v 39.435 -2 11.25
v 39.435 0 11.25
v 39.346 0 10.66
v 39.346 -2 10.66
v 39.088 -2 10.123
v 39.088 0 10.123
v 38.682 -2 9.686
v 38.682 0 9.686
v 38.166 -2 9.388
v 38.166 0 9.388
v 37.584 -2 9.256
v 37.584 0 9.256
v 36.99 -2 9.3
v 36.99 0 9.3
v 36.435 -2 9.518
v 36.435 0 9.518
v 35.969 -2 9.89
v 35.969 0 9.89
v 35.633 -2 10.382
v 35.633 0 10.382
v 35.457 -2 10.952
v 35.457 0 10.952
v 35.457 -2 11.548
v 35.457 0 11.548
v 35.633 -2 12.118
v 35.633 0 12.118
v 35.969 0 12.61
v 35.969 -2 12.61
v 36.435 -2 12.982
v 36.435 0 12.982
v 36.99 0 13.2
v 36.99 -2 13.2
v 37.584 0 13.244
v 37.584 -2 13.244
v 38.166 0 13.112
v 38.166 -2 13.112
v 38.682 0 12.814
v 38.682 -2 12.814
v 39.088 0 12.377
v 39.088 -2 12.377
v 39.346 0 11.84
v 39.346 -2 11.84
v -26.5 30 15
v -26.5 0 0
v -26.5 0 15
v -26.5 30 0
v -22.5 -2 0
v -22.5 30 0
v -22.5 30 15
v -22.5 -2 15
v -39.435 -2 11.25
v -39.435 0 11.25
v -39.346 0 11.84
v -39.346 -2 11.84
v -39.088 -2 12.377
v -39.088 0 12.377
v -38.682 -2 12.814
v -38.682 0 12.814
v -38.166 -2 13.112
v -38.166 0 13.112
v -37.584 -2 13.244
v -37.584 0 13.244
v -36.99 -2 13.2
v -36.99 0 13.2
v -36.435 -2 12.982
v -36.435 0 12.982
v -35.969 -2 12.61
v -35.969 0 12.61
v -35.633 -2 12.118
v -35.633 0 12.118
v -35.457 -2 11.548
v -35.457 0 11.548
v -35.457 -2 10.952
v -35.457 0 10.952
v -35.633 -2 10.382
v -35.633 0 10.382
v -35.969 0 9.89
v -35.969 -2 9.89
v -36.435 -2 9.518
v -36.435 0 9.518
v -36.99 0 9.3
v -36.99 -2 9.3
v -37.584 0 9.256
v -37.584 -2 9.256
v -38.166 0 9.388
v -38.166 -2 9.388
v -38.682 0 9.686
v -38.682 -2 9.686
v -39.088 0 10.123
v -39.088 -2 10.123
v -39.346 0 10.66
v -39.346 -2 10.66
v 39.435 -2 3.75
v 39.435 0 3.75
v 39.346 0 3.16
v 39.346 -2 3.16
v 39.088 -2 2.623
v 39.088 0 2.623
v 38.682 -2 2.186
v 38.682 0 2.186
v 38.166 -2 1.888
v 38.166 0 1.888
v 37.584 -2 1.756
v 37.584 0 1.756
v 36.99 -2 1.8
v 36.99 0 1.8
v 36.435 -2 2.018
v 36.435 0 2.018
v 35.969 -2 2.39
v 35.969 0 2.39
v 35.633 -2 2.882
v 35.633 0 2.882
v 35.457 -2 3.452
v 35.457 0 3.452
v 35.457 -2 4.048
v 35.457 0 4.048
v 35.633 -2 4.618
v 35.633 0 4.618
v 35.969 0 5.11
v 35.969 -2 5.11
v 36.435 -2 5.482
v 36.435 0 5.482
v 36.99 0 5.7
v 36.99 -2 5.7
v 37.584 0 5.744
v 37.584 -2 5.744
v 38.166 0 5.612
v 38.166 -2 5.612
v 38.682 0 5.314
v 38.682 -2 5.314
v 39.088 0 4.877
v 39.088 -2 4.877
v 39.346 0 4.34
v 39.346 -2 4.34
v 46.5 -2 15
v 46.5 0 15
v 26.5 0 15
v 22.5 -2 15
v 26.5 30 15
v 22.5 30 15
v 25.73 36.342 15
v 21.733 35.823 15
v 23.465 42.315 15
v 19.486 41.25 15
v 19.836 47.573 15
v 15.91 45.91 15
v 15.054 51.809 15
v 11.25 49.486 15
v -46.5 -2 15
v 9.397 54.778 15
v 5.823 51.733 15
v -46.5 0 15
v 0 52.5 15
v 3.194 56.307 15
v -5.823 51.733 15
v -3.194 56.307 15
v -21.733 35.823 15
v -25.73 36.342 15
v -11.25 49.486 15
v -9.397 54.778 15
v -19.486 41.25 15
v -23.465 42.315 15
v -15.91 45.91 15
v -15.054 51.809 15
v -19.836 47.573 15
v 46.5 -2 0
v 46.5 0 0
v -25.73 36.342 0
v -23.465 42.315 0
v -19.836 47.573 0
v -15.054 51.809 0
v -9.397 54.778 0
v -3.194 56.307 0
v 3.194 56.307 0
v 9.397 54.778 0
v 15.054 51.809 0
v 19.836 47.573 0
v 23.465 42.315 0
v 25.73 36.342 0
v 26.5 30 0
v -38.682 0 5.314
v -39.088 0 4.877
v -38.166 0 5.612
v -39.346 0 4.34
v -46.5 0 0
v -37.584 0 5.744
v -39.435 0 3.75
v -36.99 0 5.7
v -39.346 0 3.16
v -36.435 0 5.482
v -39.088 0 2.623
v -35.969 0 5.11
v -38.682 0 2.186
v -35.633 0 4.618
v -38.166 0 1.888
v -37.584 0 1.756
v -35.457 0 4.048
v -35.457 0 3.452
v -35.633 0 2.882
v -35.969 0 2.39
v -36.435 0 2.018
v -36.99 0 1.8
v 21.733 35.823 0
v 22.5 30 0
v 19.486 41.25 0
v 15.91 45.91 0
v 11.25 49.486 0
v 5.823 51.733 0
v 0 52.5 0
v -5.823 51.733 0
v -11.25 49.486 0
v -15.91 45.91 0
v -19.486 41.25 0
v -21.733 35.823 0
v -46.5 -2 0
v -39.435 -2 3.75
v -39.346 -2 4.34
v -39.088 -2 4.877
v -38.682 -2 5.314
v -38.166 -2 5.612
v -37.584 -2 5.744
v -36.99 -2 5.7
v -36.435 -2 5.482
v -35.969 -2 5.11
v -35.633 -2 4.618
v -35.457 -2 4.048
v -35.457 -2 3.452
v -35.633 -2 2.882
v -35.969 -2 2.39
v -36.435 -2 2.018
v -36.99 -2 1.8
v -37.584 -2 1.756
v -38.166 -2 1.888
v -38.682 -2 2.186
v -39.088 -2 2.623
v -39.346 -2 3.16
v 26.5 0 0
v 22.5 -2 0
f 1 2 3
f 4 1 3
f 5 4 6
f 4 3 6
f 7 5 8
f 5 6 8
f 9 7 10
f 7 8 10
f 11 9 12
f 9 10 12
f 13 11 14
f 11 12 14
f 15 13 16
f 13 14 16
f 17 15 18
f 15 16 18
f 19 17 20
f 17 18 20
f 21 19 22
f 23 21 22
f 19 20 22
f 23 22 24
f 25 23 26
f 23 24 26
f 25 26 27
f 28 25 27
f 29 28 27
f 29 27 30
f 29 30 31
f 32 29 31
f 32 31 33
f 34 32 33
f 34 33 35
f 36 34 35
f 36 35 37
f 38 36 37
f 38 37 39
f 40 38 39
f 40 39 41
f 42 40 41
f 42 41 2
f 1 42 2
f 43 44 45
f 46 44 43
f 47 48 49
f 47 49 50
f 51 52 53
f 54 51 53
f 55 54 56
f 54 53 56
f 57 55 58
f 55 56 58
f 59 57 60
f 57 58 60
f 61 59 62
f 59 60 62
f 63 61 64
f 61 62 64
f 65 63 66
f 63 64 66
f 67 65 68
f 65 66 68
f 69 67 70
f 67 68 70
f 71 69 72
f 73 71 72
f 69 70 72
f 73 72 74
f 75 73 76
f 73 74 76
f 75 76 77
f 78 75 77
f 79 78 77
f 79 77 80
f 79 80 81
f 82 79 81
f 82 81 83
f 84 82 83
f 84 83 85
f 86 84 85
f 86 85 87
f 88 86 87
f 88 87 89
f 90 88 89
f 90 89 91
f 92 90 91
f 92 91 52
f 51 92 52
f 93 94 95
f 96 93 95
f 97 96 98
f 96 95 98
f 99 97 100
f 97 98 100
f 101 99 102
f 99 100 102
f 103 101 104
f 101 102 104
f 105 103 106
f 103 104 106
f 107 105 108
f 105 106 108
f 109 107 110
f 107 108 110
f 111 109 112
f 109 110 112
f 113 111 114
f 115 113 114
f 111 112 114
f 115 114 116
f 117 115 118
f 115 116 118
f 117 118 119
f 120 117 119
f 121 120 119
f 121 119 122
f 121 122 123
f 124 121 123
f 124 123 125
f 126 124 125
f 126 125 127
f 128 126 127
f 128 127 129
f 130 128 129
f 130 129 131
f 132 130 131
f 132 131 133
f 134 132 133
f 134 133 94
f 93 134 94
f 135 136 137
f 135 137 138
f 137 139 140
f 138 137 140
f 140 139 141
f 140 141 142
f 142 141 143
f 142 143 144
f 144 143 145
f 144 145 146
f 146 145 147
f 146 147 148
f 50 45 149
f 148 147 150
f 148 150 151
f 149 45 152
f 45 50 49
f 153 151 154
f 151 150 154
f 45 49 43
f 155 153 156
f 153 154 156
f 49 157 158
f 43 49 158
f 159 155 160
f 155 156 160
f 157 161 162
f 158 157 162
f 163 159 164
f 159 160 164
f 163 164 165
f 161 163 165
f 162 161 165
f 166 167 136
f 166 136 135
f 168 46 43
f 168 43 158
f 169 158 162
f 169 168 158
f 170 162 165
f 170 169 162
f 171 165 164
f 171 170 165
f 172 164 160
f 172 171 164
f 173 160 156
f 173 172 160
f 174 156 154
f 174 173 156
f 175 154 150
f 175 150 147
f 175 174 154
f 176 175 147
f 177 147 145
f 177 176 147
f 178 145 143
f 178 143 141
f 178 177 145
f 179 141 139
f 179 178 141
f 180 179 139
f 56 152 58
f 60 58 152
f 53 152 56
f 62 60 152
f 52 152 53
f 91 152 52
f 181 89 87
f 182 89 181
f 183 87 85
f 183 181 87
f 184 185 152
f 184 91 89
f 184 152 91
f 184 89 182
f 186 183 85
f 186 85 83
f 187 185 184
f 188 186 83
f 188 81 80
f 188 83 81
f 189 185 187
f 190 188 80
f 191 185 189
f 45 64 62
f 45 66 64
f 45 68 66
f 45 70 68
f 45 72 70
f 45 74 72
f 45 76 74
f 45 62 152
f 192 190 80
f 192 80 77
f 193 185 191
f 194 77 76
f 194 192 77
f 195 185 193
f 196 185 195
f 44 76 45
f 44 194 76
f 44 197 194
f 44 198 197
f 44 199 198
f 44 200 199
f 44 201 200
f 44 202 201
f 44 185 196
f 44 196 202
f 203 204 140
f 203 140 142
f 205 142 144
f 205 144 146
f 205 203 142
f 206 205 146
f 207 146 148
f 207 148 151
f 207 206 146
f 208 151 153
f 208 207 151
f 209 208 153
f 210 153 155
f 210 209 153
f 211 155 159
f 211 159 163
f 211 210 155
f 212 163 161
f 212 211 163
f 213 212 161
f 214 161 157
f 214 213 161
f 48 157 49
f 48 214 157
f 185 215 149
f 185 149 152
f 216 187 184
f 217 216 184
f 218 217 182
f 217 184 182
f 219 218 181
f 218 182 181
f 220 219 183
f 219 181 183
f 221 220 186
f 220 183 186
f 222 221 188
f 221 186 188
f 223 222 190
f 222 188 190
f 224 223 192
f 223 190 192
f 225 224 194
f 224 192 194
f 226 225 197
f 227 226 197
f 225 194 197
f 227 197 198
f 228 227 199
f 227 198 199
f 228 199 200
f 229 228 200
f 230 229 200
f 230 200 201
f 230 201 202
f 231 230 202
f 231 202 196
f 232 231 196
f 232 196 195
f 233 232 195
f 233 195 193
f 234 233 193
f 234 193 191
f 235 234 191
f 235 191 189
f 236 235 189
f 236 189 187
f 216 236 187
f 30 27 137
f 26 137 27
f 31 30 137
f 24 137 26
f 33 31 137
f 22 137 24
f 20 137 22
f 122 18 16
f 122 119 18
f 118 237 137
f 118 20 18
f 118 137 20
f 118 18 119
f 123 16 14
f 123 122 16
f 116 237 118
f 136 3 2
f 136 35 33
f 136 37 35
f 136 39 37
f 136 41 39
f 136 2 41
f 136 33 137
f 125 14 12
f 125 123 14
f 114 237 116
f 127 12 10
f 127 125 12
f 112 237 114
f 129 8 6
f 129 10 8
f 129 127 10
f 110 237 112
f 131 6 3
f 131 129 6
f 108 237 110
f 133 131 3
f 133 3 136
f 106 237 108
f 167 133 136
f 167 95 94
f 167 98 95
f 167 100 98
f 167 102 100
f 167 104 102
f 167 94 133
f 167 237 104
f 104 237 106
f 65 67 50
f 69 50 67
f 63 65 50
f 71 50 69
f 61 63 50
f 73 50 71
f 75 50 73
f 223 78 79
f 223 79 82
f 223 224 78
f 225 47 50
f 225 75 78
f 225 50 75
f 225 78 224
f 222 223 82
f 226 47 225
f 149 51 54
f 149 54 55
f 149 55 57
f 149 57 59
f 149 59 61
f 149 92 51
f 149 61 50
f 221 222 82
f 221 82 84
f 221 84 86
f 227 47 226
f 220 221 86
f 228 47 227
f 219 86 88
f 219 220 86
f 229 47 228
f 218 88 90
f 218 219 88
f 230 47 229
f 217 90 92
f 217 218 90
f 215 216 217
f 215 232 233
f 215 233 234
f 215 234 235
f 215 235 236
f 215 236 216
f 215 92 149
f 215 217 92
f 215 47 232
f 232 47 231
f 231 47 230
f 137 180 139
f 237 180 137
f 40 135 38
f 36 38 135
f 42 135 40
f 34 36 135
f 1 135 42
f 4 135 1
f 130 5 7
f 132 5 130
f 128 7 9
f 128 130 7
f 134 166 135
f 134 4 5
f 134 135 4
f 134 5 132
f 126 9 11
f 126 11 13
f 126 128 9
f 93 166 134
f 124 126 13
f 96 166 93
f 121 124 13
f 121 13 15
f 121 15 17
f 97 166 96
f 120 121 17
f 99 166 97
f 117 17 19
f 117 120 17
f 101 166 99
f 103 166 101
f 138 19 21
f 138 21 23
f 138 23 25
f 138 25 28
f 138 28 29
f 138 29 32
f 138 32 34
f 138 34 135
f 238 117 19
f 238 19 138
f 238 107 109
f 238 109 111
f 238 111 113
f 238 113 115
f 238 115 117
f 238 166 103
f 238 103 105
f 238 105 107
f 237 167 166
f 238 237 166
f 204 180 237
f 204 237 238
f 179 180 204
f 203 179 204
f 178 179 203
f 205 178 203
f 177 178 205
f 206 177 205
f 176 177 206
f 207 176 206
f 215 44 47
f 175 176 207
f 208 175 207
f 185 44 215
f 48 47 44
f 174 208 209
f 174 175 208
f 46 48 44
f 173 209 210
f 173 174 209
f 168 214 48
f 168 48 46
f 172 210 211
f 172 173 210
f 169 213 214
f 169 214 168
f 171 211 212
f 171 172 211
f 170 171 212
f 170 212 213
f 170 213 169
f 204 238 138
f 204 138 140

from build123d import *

# Parameters (mm, degrees)
BOSS_EXTRUDE1_DEPTH = 15
SKETCH2_R           = 2
CUT_EXTRUDE1_DEPTH  = 75.696050766


with BuildPart() as part:
    # Sketch1 → Boss-Extrude1 (new body)
    with BuildSketch(Plane.XY):
        with BuildLine():
            Line((-22.5, 30), (-22.5, 0))
            Line((-22.5, 0), (-22.5, -2))
            Line((-22.5, -2), (-46.5, -2))
            Line((-46.5, -2), (-46.5, 0))
            Line((-46.5, 0), (-26.5, 0))
            Line((-26.5, 0), (-26.5, 30))
            ThreePointArc((-26.5, 30), (0, 56.5), (26.5, 30))
            Line((26.5, 30), (26.5, 0))
            Line((26.5, 0), (46.5, 0))
            Line((46.5, 0), (46.5, -2))
            Line((46.5, -2), (22.5, -2))
            Line((22.5, -2), (22.5, 0))
            Line((22.5, 0), (22.5, 30))
            ThreePointArc((22.5, 30), (0, 52.5), (-22.5, 30))
        make_face()
    extrude(amount=BOSS_EXTRUDE1_DEPTH)

    # Sketch2 → Cut-Extrude1 (cut, through all)
    with BuildSketch(Plane(origin=(0, 0, 0), x_dir=(1, 0, 0), z_dir=(0, 1, 0))):
        with Locations(Location((-37.435032434, -3.75, 0), (0, 0, 180))):
            Circle(SKETCH2_R)
        with Locations(Location((-37.435032434, -11.25, 0), (0, 0, 180))):
            Circle(SKETCH2_R)
        with Locations((37.435032434, -11.25)):
            Circle(SKETCH2_R)
        with Locations((37.435032434, -3.75)):
            Circle(SKETCH2_R)
    extrude(amount=-CUT_EXTRUDE1_DEPTH, mode=Mode.SUBTRACT)


solid = part.part
